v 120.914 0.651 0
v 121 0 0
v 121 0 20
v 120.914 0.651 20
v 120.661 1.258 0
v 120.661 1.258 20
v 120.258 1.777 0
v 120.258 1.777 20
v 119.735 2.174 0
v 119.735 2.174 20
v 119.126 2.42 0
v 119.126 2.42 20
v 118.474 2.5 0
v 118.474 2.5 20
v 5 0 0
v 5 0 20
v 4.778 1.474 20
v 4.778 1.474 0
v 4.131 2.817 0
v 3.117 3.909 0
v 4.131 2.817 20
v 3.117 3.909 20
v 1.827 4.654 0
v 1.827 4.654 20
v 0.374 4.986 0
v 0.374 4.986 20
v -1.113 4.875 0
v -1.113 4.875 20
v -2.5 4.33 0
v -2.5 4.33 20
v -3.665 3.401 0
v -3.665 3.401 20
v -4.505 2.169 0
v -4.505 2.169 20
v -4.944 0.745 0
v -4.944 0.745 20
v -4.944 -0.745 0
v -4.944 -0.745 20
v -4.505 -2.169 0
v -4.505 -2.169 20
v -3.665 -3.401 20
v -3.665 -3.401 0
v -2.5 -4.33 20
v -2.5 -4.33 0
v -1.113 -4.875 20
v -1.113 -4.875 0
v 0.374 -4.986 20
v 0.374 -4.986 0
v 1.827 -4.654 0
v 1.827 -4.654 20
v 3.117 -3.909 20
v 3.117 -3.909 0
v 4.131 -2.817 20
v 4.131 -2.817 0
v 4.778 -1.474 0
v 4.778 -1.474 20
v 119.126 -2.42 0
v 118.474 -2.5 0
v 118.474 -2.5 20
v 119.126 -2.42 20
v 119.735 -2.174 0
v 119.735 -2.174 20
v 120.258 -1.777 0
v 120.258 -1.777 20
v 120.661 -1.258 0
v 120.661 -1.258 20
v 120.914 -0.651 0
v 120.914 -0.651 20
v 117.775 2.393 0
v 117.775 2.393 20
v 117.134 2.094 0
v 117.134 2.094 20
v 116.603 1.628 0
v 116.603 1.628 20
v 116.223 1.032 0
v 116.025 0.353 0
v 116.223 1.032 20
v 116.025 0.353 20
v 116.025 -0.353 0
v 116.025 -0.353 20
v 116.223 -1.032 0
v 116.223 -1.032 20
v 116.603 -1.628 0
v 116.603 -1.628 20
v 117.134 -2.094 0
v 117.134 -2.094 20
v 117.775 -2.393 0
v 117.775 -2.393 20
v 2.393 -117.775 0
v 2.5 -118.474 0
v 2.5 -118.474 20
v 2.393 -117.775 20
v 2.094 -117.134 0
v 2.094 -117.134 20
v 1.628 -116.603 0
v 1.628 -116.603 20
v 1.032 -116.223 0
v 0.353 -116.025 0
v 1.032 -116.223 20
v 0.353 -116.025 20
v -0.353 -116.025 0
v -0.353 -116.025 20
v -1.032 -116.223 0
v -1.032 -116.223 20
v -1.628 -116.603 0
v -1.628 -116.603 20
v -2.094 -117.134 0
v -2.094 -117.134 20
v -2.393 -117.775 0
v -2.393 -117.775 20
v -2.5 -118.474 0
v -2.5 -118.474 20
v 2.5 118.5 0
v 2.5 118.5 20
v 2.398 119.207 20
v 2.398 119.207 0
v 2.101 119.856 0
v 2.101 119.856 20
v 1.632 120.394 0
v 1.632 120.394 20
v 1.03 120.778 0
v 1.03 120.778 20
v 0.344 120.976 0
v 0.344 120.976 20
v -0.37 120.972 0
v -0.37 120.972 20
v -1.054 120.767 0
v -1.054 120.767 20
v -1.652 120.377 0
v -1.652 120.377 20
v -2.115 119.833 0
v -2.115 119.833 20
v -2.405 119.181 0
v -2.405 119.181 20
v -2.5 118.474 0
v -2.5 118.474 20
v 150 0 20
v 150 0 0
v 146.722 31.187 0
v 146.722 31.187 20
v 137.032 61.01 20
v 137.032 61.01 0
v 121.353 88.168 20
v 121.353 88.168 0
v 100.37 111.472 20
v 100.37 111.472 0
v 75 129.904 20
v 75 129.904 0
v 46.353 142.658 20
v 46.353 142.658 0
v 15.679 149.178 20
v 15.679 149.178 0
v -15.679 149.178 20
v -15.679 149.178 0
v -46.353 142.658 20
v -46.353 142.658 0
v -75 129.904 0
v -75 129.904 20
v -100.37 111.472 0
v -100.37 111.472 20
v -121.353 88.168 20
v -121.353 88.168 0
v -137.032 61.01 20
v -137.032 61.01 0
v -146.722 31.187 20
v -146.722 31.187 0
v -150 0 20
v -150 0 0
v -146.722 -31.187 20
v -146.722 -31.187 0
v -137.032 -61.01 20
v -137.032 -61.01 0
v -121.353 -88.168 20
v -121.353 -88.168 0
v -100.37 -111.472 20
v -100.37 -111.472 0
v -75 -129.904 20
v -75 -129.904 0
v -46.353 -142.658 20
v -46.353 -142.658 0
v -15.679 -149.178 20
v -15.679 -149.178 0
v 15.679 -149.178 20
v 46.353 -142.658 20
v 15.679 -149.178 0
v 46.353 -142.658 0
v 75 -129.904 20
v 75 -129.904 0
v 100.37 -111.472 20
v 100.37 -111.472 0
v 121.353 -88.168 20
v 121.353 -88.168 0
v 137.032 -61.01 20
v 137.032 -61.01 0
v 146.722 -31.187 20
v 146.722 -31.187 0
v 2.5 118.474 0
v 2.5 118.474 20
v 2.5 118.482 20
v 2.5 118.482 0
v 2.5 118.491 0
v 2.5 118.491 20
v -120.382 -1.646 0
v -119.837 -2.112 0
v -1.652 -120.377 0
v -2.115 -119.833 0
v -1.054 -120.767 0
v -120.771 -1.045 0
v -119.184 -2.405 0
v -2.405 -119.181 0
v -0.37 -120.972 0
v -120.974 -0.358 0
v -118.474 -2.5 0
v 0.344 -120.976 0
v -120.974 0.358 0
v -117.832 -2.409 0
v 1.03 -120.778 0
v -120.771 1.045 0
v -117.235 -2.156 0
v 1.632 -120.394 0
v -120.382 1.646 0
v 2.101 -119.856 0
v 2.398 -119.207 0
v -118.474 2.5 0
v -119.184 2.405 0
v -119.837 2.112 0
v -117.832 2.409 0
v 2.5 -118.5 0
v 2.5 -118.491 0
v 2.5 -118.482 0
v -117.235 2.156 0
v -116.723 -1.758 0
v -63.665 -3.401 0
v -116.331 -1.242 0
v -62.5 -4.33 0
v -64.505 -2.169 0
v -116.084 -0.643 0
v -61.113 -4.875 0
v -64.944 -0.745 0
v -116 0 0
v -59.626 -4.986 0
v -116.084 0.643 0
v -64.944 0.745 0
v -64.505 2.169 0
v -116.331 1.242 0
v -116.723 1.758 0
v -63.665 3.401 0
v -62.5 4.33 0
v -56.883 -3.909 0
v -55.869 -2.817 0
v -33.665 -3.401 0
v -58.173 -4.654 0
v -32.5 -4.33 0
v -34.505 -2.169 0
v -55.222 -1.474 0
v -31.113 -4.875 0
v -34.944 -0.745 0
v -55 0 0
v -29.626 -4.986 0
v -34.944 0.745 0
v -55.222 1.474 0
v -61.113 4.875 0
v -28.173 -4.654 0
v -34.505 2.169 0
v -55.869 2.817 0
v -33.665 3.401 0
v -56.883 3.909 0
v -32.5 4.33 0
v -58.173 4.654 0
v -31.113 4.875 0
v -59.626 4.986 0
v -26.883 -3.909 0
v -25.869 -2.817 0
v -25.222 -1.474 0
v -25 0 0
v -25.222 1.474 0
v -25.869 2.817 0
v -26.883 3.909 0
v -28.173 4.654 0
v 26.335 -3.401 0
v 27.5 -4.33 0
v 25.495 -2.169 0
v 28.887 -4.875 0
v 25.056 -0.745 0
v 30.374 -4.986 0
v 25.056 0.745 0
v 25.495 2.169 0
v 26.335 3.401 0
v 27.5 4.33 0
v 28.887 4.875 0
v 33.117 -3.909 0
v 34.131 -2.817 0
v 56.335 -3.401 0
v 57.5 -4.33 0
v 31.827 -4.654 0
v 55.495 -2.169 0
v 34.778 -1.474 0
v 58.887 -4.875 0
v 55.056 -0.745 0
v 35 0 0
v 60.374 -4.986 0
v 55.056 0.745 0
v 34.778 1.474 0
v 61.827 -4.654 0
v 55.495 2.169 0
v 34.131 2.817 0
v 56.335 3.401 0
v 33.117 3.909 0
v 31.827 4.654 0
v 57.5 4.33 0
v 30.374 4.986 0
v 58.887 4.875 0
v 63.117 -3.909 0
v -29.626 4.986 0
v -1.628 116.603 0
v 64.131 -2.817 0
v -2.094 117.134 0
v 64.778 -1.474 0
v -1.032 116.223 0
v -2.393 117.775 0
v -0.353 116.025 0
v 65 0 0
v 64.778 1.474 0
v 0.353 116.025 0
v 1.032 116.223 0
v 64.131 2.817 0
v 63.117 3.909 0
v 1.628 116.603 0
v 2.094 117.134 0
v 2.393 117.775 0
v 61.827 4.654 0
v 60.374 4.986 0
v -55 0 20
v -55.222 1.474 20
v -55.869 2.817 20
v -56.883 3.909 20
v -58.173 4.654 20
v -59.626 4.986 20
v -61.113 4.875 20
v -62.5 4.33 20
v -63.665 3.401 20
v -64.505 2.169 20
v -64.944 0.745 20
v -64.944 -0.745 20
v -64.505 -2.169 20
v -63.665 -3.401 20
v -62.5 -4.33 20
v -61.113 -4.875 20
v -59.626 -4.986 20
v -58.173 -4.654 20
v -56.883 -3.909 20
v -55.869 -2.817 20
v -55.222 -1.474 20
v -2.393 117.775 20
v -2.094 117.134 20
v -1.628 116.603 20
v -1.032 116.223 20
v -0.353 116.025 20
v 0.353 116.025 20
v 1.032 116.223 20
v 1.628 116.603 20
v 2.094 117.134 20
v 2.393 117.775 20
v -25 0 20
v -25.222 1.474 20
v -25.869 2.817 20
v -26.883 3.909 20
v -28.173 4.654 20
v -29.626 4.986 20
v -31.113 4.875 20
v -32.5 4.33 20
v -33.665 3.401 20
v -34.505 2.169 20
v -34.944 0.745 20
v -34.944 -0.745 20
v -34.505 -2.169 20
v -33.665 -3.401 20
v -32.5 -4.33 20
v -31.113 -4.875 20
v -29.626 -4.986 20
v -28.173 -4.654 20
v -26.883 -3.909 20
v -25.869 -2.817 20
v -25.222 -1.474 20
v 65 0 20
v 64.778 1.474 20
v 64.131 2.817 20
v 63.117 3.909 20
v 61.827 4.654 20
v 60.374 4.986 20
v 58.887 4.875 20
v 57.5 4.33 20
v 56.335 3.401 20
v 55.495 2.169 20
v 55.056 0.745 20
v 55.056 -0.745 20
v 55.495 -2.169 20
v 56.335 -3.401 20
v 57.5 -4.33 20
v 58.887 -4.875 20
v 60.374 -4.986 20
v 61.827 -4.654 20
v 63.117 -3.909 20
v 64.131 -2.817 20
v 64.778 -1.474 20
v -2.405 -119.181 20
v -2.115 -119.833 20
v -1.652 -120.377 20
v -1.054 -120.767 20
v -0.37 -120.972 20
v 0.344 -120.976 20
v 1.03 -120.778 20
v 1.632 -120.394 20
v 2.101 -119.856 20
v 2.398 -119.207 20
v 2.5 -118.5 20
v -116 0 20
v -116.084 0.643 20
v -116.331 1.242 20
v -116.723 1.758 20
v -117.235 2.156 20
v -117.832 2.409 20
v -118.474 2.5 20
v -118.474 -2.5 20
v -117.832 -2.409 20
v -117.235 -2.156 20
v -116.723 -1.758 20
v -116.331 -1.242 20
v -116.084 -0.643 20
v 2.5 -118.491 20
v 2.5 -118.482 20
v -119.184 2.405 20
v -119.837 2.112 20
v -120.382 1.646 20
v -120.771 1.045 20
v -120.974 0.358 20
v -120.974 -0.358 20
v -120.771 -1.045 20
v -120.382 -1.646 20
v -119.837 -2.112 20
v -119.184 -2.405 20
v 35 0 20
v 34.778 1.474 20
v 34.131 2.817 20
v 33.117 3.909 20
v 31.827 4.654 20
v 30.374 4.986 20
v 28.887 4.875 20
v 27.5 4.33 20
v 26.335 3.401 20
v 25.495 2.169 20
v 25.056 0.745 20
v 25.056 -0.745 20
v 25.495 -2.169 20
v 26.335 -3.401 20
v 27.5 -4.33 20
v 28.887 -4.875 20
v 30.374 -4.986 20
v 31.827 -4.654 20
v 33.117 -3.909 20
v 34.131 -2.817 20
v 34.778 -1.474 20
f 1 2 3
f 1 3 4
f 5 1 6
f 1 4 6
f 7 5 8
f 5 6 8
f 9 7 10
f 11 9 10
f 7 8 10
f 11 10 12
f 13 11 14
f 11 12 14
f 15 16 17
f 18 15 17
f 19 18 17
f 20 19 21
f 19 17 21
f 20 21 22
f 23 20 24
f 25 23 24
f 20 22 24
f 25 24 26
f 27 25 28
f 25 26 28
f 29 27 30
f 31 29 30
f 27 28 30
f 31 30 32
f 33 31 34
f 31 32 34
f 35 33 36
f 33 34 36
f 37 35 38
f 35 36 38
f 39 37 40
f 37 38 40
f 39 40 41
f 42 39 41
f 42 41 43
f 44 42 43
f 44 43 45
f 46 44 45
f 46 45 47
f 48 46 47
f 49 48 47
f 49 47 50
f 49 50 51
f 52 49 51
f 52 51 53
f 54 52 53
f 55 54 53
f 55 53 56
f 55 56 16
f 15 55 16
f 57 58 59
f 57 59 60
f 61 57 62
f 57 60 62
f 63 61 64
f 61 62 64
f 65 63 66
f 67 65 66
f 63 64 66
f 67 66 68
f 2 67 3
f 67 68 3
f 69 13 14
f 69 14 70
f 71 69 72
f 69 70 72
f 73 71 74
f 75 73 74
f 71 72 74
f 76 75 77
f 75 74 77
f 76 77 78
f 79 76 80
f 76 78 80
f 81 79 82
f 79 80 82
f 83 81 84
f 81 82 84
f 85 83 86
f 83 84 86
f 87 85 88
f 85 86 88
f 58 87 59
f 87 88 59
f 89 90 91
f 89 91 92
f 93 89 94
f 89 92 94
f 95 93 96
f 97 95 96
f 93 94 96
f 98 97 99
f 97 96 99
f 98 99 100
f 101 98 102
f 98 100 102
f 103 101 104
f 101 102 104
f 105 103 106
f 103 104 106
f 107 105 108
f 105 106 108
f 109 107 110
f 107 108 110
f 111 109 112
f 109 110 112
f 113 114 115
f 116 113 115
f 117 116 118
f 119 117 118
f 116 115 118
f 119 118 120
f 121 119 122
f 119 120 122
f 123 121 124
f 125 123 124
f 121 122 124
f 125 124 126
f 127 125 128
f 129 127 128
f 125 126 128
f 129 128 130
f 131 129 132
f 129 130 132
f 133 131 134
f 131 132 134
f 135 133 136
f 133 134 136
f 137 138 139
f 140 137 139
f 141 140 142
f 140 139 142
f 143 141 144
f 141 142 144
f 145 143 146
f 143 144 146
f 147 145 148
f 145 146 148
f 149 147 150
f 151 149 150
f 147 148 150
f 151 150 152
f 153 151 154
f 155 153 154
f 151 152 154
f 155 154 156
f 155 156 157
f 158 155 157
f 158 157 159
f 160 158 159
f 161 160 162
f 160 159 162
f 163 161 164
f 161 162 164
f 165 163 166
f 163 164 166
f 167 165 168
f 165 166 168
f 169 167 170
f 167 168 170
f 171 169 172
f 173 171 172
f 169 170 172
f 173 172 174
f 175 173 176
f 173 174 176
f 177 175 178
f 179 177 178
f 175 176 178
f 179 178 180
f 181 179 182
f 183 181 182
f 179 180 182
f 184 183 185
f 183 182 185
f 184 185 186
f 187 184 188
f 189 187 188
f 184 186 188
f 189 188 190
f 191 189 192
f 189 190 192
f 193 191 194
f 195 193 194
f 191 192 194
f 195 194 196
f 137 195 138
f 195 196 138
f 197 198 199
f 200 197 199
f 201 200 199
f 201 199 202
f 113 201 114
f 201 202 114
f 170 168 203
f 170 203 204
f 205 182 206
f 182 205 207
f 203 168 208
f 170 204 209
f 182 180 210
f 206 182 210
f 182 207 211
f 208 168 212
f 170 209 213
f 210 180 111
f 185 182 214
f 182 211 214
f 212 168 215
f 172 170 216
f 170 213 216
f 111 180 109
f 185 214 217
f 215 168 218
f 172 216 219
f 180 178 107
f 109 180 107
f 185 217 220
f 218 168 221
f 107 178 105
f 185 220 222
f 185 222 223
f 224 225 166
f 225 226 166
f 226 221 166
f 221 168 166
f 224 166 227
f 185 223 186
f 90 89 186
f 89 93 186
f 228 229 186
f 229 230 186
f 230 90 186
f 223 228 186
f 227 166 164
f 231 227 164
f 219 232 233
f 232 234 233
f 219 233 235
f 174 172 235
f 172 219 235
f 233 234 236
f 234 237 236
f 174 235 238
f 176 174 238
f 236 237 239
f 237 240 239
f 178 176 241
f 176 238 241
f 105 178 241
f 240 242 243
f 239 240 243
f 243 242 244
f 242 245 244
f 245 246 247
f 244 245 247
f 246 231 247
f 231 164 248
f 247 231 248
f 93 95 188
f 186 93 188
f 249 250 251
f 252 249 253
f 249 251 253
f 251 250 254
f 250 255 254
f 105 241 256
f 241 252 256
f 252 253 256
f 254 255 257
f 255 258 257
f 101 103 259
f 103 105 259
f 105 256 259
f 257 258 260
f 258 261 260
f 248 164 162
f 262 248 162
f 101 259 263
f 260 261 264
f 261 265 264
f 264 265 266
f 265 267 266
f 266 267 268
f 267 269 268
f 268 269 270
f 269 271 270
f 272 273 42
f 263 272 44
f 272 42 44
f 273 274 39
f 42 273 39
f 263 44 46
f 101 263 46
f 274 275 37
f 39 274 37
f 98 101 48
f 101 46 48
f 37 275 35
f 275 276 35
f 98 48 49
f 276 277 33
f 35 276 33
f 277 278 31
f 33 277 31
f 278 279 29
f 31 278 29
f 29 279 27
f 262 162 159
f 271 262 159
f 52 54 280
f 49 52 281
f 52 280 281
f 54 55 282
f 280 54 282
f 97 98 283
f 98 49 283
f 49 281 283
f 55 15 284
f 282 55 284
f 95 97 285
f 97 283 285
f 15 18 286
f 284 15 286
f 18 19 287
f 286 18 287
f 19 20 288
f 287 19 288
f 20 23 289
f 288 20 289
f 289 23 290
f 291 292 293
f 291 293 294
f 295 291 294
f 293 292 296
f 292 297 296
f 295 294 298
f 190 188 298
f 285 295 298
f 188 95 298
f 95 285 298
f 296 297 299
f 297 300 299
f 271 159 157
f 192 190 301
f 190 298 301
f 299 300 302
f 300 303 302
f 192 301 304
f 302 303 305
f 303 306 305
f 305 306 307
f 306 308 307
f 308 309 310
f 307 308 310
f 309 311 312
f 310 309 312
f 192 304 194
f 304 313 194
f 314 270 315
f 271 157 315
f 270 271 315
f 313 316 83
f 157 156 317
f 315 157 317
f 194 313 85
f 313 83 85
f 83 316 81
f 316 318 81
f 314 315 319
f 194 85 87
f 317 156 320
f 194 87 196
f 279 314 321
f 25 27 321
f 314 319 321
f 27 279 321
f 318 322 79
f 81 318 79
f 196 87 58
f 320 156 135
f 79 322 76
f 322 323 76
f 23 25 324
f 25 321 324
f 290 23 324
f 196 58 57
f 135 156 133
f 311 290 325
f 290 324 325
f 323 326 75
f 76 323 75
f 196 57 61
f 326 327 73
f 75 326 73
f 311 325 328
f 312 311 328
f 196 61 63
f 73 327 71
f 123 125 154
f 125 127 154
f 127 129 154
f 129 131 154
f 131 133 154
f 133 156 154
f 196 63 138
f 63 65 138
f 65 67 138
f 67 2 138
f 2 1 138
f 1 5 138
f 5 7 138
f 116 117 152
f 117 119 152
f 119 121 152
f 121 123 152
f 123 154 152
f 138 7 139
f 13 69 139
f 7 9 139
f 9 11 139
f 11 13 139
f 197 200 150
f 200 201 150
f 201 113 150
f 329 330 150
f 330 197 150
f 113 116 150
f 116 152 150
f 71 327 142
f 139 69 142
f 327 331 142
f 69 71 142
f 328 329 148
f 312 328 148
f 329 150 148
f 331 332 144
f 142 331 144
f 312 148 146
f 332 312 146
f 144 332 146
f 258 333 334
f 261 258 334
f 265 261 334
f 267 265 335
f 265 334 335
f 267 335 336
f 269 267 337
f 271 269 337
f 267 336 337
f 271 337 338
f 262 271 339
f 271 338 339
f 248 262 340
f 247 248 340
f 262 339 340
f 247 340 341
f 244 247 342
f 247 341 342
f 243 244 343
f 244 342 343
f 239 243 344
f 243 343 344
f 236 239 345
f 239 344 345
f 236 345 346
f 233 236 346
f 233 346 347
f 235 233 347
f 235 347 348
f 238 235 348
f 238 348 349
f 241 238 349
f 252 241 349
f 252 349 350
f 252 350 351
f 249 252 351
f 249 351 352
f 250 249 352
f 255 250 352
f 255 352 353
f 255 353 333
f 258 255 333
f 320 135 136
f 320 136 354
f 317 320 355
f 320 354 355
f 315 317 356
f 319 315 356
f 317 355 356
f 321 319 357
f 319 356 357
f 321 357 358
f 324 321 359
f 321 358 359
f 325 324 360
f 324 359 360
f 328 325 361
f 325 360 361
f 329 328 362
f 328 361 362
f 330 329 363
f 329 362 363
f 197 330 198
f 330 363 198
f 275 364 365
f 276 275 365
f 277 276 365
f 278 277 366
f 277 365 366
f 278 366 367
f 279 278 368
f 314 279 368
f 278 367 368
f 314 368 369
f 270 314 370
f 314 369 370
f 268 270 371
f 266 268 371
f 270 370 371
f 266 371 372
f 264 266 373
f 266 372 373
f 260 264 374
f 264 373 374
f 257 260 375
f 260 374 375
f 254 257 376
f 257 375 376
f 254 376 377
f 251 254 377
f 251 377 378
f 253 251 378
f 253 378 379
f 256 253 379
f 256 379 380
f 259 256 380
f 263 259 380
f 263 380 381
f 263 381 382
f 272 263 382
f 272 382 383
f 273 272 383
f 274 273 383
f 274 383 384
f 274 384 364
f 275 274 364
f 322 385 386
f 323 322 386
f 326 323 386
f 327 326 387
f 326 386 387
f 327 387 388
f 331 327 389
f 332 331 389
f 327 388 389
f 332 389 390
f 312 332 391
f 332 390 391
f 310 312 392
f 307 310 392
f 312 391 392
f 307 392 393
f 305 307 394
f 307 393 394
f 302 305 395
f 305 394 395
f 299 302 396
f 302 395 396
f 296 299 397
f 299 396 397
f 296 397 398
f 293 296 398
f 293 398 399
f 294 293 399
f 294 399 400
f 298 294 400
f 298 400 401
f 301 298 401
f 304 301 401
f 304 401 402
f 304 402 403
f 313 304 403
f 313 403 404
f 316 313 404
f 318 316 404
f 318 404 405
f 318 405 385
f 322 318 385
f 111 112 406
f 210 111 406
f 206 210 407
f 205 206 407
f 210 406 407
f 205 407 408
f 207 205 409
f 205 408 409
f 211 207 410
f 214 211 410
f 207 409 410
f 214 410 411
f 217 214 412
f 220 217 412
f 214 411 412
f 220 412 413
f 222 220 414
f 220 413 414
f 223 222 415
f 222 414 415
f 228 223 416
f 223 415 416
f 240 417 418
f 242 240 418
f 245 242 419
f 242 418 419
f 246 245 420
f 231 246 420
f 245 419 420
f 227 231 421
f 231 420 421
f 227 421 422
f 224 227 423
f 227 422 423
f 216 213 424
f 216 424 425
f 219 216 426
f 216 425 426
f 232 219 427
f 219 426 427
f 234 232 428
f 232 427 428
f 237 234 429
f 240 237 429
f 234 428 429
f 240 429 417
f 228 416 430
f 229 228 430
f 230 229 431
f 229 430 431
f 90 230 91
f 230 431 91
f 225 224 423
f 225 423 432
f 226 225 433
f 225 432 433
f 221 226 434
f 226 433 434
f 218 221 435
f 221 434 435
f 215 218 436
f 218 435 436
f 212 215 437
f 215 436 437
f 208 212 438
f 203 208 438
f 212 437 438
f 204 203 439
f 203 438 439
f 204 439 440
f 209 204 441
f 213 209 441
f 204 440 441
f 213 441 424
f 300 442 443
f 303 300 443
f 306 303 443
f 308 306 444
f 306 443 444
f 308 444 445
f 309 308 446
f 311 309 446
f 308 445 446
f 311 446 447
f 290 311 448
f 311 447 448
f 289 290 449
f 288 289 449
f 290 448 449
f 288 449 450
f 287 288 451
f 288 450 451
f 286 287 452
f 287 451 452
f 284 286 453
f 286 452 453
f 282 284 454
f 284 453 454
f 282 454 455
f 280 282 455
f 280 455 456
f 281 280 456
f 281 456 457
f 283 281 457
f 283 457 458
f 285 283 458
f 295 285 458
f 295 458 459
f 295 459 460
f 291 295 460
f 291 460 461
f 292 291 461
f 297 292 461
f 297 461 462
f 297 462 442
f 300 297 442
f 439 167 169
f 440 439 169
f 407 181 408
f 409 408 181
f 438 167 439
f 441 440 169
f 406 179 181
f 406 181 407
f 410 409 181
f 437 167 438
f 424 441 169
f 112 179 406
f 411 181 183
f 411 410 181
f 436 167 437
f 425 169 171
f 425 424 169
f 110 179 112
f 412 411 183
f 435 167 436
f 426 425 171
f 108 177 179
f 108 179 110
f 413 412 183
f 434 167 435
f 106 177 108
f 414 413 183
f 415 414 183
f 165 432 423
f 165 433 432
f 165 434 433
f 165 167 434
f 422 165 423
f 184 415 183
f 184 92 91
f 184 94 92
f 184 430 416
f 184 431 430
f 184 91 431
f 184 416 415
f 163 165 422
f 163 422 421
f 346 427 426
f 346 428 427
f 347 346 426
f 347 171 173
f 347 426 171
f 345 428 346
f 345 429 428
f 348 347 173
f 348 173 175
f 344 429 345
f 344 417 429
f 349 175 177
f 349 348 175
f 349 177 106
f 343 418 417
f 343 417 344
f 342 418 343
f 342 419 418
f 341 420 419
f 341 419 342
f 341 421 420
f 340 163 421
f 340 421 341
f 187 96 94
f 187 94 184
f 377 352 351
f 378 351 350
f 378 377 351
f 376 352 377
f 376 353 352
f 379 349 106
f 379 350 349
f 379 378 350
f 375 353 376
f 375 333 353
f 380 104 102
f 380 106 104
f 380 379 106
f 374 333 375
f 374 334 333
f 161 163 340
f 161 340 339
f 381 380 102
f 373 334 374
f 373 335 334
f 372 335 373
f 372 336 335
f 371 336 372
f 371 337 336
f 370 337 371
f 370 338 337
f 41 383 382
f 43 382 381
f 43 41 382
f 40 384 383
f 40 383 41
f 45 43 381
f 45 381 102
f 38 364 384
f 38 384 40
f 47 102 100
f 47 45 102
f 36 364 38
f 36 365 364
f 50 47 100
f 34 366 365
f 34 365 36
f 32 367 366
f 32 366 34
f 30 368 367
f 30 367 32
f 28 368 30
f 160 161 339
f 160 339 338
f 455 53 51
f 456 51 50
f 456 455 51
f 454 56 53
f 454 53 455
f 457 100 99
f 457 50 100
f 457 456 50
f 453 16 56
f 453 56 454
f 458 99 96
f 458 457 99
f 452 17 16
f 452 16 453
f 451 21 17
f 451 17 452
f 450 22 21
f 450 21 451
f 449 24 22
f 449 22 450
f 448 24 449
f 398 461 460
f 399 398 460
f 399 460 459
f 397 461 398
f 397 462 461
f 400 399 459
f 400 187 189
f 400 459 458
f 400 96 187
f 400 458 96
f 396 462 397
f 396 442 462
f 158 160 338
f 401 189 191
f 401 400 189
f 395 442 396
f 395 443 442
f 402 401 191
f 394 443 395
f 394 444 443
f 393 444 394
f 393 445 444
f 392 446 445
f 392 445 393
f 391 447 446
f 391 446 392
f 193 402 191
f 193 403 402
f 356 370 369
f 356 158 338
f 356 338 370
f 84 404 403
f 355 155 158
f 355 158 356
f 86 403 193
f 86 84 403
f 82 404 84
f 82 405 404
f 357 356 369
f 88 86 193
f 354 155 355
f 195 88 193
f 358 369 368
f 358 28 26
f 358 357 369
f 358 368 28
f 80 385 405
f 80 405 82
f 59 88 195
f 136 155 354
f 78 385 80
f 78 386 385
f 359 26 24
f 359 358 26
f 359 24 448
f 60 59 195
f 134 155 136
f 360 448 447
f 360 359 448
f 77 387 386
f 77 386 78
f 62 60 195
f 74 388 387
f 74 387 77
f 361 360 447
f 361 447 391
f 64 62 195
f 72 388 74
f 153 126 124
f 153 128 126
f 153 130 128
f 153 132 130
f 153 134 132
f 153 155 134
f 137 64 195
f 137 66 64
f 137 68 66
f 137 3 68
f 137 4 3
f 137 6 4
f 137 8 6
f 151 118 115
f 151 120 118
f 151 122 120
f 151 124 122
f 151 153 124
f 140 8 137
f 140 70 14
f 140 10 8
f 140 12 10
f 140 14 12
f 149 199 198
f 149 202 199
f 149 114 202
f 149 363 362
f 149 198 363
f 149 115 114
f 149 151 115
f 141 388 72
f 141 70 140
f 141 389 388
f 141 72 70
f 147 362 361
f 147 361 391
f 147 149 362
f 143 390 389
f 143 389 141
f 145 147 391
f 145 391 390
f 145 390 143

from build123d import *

# Parameters (mm, degrees)
F0_R     = 150
F1_DEPTH = 20
F3_DEPTH = 20.001
F4_R     = 5
F5_DEPTH = 20.001


with BuildPart() as f1:
    # F0 (on Top) → F1 (new body)
    with BuildSketch(Plane.XY):
        Circle(F0_R)
    extrude(amount=F1_DEPTH)

    # F2 (on face) → F3 (cut, through all)
    with BuildSketch(Plane.XY.offset(20)):
        with BuildLine():
            ThreePointArc((-2.499860907, 118.473628692), (0, 118.5), (2.499860907, 118.473628692))
            ThreePointArc((2.499860907, 118.473628692), (2.4999652265, 118.4868141626), (2.5, 118.5))
            ThreePointArc((2.5, 118.5), (-0.0131858374, 120.9999652265), (-2.499860907, 118.473628692))
        make_face()
        with BuildLine():
            ThreePointArc((-2.499860907, 118.473628692), (0, 116), (2.499860907, 118.473628692))
            ThreePointArc((2.499860907, 118.473628692), (0, 118.5), (-2.499860907, 118.473628692))
        make_face()
        with BuildLine():
            ThreePointArc((-118.473628692, -2.499860907), (-118.5, 0), (-118.473628692, 2.499860907))
            ThreePointArc((-118.473628692, 2.499860907), (-121, 0), (-118.473628692, -2.499860907))
        make_face()
        with BuildLine():
            ThreePointArc((-116, 0), (-116.7229338406, 1.7584185693), (-118.473628692, 2.499860907))
            ThreePointArc((-118.473628692, 2.499860907), (-118.5, 0), (-118.473628692, -2.499860907))
            ThreePointArc((-118.473628692, -2.499860907), (-116.7229338406, -1.7584185693), (-116, 0))
        make_face()
        with BuildLine():
            ThreePointArc((118.473628692, -2.499860907), (118.4934069896, -1.25), (118.5, 0))
            ThreePointArc((118.5, 0), (118.4934069896, 1.25), (118.473628692, 2.499860907))
            ThreePointArc((118.473628692, 2.499860907), (116, 0), (118.473628692, -2.499860907))
        make_face()
        with BuildLine():
            ThreePointArc((118.473628692, 2.499860907), (118.4934069896, 1.25), (118.5, 0))
            ThreePointArc((118.5, 0), (118.4934069896, -1.25), (118.473628692, -2.499860907))
            ThreePointArc((118.473628692, -2.499860907), (120.2584185693, -1.7770661594), (121, 0))
            ThreePointArc((121, 0), (120.2584185693, 1.7770661594), (118.473628692, 2.499860907))
        make_face()
        with BuildLine():
            ThreePointArc((-2.499860907, -118.473628692), (0, -118.5), (2.499860907, -118.473628692))
            ThreePointArc((2.499860907, -118.473628692), (0, -116), (-2.499860907, -118.473628692))
        make_face()
        with BuildLine():
            ThreePointArc((2.5, -118.5), (2.4999652265, -118.4868141626), (2.499860907, -118.473628692))
            ThreePointArc((2.499860907, -118.473628692), (0, -118.5), (-2.499860907, -118.473628692))
            ThreePointArc((-2.499860907, -118.473628692), (-0.0131858374, -120.9999652265), (2.5, -118.5))
        make_face()
    extrude(amount=-F3_DEPTH, mode=Mode.SUBTRACT)

    # F4 (on face) → F5 (cut, through all)
    with BuildSketch(Plane.XY.offset(20)):
        Circle(F4_R)
        with Locations((30, 0)):
            Circle(F4_R)
        with Locations((60, 0)):
            Circle(F4_R)
        with Locations((-30, 0)):
            Circle(F4_R)
        with Locations((-60, 0)):
            Circle(F4_R)
    extrude(amount=-F5_DEPTH, mode=Mode.SUBTRACT)


solid = f1.part
